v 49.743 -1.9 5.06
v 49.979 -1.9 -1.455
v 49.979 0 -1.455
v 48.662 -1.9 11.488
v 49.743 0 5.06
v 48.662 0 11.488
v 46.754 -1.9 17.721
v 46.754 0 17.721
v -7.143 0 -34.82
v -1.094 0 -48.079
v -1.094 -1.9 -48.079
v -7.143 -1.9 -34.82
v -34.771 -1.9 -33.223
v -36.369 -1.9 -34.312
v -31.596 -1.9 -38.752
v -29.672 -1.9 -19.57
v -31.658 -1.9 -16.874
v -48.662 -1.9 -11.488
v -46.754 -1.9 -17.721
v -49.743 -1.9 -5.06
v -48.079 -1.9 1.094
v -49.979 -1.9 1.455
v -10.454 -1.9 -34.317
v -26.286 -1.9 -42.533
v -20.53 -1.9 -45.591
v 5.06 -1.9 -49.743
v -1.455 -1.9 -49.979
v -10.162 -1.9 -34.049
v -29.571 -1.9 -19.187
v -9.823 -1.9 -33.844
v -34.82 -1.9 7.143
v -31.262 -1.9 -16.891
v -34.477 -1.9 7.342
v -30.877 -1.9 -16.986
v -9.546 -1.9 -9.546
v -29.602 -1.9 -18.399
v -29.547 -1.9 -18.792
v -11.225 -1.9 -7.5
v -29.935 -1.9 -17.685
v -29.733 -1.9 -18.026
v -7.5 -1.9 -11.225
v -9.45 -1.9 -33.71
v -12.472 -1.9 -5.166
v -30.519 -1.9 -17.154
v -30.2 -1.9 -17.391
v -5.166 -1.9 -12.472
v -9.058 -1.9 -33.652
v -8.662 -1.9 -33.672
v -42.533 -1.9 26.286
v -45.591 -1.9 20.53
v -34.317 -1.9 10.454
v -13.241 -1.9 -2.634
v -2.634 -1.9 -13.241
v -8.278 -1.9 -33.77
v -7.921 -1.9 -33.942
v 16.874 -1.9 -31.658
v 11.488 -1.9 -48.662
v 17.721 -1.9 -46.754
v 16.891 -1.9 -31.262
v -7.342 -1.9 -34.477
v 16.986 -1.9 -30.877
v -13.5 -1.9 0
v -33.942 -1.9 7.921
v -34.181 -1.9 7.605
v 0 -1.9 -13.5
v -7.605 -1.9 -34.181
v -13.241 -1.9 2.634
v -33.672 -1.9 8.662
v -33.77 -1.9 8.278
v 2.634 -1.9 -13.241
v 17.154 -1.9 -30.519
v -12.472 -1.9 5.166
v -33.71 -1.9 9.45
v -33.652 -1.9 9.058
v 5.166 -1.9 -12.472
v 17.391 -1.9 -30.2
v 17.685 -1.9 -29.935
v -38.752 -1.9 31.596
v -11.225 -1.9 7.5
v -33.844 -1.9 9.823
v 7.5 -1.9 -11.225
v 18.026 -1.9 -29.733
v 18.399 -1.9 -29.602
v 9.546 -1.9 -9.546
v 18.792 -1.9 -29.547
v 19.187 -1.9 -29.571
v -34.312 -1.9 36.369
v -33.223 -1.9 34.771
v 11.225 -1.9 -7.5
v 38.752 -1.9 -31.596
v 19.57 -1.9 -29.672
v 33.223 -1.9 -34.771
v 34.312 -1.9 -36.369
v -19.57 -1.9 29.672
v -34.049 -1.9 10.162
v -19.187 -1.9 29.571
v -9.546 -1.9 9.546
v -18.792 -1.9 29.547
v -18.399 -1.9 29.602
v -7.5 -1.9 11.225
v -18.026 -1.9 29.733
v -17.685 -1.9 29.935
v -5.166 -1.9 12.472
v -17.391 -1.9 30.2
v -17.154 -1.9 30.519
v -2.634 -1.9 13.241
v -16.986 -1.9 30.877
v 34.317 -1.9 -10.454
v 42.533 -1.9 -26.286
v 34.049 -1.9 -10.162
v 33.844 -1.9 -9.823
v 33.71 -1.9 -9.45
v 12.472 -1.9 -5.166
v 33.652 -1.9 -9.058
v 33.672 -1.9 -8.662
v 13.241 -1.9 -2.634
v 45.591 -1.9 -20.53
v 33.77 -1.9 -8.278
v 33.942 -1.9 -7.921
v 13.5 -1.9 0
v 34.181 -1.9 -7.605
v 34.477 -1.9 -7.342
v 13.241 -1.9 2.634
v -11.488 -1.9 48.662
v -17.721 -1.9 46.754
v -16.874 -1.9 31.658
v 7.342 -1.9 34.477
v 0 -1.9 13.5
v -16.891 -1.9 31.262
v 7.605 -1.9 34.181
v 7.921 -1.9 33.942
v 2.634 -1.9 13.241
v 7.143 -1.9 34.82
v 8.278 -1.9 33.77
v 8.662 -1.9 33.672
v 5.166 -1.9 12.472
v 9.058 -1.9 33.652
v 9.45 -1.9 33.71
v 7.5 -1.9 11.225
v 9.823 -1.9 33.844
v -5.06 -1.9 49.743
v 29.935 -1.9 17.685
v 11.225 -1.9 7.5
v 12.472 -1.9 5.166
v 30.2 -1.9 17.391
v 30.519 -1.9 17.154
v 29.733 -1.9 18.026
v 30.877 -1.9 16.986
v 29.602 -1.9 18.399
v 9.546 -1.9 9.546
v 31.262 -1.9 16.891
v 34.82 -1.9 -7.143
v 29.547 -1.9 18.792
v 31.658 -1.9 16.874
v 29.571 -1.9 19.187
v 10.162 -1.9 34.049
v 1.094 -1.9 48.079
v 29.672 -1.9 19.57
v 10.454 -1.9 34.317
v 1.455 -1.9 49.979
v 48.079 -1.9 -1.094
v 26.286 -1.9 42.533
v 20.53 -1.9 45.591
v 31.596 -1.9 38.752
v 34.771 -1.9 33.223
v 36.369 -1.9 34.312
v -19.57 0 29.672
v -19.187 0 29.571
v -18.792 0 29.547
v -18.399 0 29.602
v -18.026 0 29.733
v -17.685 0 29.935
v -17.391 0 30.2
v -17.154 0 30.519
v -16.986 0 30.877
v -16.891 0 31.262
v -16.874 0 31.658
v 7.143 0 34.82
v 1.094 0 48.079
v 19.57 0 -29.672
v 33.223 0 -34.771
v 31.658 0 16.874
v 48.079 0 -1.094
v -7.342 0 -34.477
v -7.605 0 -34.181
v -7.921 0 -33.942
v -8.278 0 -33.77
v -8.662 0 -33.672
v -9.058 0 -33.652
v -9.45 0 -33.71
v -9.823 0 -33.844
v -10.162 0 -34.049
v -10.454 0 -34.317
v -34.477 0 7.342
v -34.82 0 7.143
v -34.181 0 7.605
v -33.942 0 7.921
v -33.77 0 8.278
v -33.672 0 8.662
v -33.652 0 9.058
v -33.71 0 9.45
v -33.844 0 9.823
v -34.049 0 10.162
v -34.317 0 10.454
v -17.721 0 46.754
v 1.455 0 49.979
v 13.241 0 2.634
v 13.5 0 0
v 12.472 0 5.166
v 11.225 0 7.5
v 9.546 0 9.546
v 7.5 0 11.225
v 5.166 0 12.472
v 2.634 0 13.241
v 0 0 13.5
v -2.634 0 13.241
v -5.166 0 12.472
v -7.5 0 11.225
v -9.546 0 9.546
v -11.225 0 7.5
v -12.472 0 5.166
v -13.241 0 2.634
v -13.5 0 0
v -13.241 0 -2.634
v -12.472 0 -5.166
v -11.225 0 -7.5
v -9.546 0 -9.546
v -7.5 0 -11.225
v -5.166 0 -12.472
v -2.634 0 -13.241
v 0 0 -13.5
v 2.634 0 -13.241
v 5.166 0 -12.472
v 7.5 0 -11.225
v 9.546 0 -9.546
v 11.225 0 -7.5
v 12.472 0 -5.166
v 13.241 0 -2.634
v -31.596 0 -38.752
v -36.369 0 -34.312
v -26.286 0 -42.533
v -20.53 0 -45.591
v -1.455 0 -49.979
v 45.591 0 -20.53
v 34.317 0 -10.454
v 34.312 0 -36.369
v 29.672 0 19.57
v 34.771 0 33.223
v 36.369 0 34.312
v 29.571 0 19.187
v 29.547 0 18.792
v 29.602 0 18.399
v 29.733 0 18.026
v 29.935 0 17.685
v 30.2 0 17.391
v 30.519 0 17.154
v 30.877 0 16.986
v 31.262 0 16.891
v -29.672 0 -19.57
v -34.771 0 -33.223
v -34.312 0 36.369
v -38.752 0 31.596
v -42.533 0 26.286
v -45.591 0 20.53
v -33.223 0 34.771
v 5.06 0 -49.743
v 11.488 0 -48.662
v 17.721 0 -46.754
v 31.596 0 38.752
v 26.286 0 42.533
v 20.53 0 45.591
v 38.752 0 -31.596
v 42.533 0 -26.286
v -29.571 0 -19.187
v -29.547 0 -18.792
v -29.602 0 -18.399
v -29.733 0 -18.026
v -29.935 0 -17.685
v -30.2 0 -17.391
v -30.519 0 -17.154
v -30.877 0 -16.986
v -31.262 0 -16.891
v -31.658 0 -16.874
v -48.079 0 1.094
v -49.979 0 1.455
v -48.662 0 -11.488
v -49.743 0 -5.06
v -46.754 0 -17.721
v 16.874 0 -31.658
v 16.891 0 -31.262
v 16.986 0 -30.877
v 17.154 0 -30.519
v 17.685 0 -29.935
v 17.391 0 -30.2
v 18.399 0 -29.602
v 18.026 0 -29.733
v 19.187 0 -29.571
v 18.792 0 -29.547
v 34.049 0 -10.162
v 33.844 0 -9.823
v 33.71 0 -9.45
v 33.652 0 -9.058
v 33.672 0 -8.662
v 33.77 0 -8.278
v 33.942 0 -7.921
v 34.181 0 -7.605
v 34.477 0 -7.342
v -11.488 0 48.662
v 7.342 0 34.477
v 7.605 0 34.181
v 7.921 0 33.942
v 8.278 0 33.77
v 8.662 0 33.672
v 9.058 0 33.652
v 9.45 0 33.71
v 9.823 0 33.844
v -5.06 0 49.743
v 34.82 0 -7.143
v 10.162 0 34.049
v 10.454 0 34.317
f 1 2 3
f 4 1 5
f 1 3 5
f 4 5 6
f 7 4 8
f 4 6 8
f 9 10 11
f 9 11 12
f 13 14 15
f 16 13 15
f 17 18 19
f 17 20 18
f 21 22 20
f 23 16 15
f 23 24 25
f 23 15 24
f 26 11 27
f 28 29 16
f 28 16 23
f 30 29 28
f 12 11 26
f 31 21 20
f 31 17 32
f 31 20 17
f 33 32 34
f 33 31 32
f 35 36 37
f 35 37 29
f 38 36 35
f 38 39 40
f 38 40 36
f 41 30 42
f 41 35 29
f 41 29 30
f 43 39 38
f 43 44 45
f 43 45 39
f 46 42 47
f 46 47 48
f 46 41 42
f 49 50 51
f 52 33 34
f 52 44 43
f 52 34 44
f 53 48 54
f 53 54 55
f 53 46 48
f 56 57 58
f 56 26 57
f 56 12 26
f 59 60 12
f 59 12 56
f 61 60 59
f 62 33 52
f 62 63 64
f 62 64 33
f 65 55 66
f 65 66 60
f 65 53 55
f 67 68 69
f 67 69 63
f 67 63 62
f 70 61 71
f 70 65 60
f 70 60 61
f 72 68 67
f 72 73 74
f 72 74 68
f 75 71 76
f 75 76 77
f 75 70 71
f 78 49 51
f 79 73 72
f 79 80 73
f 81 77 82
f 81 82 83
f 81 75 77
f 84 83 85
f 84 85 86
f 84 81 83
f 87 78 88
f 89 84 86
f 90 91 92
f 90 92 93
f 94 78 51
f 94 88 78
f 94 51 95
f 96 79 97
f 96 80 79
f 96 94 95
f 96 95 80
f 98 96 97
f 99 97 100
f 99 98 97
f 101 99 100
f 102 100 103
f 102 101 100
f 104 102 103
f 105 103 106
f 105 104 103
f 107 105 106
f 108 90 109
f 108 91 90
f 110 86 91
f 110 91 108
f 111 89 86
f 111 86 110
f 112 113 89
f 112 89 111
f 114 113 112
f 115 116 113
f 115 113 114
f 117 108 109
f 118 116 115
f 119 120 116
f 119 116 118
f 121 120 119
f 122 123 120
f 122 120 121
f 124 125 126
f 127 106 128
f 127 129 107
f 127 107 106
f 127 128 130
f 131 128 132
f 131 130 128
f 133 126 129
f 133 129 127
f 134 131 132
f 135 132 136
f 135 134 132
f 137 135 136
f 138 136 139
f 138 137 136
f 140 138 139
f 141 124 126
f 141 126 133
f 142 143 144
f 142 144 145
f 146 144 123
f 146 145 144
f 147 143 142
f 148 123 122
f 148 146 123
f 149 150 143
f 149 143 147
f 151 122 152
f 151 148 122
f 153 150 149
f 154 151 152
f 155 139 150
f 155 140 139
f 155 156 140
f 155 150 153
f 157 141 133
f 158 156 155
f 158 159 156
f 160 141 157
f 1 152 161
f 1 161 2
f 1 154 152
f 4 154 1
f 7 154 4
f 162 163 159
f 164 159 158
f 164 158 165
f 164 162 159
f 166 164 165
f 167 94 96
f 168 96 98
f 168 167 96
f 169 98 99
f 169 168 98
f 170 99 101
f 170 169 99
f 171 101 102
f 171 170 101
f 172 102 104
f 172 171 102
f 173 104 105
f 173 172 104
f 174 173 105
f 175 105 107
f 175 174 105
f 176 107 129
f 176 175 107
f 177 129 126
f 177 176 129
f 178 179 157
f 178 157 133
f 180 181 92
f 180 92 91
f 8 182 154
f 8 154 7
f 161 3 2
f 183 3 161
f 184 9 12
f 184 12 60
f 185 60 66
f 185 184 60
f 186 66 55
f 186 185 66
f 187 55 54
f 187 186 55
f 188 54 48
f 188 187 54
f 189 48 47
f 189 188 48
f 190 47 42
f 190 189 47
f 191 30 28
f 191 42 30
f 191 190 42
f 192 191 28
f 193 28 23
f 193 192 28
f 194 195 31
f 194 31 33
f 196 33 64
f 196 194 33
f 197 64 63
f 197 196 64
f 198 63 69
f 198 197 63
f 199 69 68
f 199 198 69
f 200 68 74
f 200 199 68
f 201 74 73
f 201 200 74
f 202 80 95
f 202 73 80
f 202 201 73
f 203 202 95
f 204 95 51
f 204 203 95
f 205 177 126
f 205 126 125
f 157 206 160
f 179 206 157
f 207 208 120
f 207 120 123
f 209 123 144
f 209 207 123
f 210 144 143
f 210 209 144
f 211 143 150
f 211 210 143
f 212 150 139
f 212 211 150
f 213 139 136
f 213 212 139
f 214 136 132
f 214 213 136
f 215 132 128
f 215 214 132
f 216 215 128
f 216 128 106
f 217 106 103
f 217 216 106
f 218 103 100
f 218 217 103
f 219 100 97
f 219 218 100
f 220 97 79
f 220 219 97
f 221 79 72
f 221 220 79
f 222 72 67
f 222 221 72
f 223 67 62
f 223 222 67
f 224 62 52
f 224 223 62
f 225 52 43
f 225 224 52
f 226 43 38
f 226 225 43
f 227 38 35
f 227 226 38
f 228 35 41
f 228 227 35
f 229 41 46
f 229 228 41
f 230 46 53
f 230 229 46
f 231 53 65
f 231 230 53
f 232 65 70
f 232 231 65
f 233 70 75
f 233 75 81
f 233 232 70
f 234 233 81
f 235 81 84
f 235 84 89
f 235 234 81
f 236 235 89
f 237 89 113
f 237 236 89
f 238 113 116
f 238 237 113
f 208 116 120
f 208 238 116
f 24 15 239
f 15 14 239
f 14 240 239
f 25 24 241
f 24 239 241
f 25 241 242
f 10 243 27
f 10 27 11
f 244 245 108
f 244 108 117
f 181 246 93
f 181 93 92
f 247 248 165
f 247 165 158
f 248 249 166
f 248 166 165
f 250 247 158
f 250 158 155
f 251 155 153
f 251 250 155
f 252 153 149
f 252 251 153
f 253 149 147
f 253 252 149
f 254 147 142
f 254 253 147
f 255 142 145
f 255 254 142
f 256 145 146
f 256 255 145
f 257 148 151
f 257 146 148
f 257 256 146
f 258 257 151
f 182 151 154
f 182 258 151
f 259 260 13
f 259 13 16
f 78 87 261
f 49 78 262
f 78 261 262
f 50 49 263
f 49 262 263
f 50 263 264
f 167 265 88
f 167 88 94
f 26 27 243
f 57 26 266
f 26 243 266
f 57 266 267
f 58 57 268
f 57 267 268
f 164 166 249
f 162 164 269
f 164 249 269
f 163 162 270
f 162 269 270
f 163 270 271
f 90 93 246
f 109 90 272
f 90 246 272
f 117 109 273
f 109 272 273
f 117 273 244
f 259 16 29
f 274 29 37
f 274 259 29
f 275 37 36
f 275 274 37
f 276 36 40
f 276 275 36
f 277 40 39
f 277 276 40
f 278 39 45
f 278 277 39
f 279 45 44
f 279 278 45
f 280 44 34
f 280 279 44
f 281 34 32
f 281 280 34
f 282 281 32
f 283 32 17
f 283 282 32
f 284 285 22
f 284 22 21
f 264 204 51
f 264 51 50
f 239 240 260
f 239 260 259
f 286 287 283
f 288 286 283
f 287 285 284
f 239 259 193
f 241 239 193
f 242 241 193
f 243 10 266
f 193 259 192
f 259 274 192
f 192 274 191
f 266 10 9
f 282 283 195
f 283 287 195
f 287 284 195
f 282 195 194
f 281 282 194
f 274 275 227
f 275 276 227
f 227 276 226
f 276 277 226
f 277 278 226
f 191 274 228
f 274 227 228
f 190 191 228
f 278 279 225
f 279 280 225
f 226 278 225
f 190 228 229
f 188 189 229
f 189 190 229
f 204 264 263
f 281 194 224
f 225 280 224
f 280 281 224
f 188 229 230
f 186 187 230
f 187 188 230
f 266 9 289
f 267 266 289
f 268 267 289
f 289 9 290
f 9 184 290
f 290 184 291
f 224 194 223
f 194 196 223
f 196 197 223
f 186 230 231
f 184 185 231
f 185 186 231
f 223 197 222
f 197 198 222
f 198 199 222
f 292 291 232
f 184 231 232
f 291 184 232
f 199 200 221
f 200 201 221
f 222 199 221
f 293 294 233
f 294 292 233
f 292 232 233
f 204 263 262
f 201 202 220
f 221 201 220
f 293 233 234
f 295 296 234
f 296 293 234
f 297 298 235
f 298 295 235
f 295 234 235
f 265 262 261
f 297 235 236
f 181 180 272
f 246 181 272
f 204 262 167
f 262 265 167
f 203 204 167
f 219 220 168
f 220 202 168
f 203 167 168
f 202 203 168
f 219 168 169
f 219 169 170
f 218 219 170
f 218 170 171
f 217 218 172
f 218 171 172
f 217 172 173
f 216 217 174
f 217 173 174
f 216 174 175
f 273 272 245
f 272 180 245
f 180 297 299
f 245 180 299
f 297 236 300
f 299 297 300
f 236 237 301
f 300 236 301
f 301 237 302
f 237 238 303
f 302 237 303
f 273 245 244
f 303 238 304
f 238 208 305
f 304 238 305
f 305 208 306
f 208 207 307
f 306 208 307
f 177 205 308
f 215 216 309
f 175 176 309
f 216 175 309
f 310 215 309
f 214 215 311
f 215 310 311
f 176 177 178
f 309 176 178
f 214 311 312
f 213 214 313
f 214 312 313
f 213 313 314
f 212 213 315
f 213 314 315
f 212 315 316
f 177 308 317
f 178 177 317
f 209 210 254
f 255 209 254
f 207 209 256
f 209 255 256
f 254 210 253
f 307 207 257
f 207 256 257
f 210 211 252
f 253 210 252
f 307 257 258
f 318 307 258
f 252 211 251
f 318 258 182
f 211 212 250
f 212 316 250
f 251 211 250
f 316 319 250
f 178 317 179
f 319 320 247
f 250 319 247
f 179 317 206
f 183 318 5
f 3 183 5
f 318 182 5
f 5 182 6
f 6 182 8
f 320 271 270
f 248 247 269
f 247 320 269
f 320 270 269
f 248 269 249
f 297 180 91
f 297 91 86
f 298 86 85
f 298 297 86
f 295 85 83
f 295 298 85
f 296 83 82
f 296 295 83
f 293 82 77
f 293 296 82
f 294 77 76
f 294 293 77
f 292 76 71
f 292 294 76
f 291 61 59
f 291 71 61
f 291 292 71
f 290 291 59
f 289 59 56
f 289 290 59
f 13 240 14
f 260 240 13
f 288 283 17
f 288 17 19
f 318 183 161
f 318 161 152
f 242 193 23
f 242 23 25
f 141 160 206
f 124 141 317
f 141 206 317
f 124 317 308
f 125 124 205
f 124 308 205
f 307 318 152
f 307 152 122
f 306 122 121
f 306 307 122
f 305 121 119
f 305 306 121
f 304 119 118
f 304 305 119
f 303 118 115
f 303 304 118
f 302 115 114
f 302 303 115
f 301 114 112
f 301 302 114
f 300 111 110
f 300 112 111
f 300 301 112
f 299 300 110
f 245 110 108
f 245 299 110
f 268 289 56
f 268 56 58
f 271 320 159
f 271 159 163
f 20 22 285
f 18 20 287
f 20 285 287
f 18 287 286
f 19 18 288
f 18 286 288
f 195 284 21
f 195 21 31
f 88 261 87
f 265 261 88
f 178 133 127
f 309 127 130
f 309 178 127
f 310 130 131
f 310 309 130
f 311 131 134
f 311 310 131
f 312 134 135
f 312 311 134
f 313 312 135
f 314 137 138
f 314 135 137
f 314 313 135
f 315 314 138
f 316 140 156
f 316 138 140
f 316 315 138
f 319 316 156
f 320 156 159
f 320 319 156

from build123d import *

# Parameters (mm, degrees)
F0_R            = 50
F0_R_2          = 13.5
F1_DEPTH        = 1.9
F3_DEPTH        = 25
F5_DEPTH        = 25
F5_COPIES_COUNT = 8


# Not quite as in the source:
# - a pattern or mirror of a feature is missing from the dataset's text; its kind, count and spacing are read off the source's solid


with BuildPart() as f1:
    # F0 (on Front) → F1 (new body)
    with BuildSketch(Plane.XZ):
        Circle(F0_R)
        Circle(F0_R_2, mode=Mode.SUBTRACT)
    extrude(amount=F1_DEPTH)

    # F2 (on Front) → F3 (cut)
    with BuildSketch(Plane.XZ):
        with BuildLine():
            Line((12.4794095755, 60.955286026), (0, 50.1961745322))
            Line((0, 50.1961745322), (2.7271706326, 35.8238514012))
            ThreePointArc((2.7271706326, 35.8238514012), (3.9364062163, 34.3449689954), (5.8350966322, 34.555488762))
            Line((5.8350966322, 34.555488762), (21.0234094411, 45.1330654323))
            Line((21.0234094411, 45.1330654323), (12.4794095755, 60.955286026))
        make_face()
    extrude(amount=-F3_DEPTH, mode=Mode.SUBTRACT)

    # F4 (on Front) → F5 (cut)
    with BuildSketch(Plane.XZ):
        with BuildLine():
            Line((10.4537707273, 34.3168952742), (22.7111335844, 48.0314604938))
            Line((22.7111335844, 48.0314604938), (18.2506803442, 59.0550513337))
            Line((18.2506803442, 59.0550513337), (1.7007282507, 51.2778109993))
            Line((1.7007282507, 51.2778109993), (1.0944613384, 48.079281378))
            Line((1.0944613384, 48.079281378), (7.1429279991, 34.8196319836))
            ThreePointArc((7.1429279991, 34.8196319836), (8.6623060706, 33.6723315481), (10.4537707273, 34.3168952742))
        make_face()
    f5 = extrude(amount=F5_DEPTH, mode=Mode.SUBTRACT)

    # F5_copies: F5 ×8 about axis
    f5_copies_axis = Axis((0, 0, 0), (0, 1, 0))
    for i in range(1, F5_COPIES_COUNT):
        add(f5.rotate(f5_copies_axis, i * 360 / F5_COPIES_COUNT), mode=Mode.SUBTRACT)


solid = f1.part
